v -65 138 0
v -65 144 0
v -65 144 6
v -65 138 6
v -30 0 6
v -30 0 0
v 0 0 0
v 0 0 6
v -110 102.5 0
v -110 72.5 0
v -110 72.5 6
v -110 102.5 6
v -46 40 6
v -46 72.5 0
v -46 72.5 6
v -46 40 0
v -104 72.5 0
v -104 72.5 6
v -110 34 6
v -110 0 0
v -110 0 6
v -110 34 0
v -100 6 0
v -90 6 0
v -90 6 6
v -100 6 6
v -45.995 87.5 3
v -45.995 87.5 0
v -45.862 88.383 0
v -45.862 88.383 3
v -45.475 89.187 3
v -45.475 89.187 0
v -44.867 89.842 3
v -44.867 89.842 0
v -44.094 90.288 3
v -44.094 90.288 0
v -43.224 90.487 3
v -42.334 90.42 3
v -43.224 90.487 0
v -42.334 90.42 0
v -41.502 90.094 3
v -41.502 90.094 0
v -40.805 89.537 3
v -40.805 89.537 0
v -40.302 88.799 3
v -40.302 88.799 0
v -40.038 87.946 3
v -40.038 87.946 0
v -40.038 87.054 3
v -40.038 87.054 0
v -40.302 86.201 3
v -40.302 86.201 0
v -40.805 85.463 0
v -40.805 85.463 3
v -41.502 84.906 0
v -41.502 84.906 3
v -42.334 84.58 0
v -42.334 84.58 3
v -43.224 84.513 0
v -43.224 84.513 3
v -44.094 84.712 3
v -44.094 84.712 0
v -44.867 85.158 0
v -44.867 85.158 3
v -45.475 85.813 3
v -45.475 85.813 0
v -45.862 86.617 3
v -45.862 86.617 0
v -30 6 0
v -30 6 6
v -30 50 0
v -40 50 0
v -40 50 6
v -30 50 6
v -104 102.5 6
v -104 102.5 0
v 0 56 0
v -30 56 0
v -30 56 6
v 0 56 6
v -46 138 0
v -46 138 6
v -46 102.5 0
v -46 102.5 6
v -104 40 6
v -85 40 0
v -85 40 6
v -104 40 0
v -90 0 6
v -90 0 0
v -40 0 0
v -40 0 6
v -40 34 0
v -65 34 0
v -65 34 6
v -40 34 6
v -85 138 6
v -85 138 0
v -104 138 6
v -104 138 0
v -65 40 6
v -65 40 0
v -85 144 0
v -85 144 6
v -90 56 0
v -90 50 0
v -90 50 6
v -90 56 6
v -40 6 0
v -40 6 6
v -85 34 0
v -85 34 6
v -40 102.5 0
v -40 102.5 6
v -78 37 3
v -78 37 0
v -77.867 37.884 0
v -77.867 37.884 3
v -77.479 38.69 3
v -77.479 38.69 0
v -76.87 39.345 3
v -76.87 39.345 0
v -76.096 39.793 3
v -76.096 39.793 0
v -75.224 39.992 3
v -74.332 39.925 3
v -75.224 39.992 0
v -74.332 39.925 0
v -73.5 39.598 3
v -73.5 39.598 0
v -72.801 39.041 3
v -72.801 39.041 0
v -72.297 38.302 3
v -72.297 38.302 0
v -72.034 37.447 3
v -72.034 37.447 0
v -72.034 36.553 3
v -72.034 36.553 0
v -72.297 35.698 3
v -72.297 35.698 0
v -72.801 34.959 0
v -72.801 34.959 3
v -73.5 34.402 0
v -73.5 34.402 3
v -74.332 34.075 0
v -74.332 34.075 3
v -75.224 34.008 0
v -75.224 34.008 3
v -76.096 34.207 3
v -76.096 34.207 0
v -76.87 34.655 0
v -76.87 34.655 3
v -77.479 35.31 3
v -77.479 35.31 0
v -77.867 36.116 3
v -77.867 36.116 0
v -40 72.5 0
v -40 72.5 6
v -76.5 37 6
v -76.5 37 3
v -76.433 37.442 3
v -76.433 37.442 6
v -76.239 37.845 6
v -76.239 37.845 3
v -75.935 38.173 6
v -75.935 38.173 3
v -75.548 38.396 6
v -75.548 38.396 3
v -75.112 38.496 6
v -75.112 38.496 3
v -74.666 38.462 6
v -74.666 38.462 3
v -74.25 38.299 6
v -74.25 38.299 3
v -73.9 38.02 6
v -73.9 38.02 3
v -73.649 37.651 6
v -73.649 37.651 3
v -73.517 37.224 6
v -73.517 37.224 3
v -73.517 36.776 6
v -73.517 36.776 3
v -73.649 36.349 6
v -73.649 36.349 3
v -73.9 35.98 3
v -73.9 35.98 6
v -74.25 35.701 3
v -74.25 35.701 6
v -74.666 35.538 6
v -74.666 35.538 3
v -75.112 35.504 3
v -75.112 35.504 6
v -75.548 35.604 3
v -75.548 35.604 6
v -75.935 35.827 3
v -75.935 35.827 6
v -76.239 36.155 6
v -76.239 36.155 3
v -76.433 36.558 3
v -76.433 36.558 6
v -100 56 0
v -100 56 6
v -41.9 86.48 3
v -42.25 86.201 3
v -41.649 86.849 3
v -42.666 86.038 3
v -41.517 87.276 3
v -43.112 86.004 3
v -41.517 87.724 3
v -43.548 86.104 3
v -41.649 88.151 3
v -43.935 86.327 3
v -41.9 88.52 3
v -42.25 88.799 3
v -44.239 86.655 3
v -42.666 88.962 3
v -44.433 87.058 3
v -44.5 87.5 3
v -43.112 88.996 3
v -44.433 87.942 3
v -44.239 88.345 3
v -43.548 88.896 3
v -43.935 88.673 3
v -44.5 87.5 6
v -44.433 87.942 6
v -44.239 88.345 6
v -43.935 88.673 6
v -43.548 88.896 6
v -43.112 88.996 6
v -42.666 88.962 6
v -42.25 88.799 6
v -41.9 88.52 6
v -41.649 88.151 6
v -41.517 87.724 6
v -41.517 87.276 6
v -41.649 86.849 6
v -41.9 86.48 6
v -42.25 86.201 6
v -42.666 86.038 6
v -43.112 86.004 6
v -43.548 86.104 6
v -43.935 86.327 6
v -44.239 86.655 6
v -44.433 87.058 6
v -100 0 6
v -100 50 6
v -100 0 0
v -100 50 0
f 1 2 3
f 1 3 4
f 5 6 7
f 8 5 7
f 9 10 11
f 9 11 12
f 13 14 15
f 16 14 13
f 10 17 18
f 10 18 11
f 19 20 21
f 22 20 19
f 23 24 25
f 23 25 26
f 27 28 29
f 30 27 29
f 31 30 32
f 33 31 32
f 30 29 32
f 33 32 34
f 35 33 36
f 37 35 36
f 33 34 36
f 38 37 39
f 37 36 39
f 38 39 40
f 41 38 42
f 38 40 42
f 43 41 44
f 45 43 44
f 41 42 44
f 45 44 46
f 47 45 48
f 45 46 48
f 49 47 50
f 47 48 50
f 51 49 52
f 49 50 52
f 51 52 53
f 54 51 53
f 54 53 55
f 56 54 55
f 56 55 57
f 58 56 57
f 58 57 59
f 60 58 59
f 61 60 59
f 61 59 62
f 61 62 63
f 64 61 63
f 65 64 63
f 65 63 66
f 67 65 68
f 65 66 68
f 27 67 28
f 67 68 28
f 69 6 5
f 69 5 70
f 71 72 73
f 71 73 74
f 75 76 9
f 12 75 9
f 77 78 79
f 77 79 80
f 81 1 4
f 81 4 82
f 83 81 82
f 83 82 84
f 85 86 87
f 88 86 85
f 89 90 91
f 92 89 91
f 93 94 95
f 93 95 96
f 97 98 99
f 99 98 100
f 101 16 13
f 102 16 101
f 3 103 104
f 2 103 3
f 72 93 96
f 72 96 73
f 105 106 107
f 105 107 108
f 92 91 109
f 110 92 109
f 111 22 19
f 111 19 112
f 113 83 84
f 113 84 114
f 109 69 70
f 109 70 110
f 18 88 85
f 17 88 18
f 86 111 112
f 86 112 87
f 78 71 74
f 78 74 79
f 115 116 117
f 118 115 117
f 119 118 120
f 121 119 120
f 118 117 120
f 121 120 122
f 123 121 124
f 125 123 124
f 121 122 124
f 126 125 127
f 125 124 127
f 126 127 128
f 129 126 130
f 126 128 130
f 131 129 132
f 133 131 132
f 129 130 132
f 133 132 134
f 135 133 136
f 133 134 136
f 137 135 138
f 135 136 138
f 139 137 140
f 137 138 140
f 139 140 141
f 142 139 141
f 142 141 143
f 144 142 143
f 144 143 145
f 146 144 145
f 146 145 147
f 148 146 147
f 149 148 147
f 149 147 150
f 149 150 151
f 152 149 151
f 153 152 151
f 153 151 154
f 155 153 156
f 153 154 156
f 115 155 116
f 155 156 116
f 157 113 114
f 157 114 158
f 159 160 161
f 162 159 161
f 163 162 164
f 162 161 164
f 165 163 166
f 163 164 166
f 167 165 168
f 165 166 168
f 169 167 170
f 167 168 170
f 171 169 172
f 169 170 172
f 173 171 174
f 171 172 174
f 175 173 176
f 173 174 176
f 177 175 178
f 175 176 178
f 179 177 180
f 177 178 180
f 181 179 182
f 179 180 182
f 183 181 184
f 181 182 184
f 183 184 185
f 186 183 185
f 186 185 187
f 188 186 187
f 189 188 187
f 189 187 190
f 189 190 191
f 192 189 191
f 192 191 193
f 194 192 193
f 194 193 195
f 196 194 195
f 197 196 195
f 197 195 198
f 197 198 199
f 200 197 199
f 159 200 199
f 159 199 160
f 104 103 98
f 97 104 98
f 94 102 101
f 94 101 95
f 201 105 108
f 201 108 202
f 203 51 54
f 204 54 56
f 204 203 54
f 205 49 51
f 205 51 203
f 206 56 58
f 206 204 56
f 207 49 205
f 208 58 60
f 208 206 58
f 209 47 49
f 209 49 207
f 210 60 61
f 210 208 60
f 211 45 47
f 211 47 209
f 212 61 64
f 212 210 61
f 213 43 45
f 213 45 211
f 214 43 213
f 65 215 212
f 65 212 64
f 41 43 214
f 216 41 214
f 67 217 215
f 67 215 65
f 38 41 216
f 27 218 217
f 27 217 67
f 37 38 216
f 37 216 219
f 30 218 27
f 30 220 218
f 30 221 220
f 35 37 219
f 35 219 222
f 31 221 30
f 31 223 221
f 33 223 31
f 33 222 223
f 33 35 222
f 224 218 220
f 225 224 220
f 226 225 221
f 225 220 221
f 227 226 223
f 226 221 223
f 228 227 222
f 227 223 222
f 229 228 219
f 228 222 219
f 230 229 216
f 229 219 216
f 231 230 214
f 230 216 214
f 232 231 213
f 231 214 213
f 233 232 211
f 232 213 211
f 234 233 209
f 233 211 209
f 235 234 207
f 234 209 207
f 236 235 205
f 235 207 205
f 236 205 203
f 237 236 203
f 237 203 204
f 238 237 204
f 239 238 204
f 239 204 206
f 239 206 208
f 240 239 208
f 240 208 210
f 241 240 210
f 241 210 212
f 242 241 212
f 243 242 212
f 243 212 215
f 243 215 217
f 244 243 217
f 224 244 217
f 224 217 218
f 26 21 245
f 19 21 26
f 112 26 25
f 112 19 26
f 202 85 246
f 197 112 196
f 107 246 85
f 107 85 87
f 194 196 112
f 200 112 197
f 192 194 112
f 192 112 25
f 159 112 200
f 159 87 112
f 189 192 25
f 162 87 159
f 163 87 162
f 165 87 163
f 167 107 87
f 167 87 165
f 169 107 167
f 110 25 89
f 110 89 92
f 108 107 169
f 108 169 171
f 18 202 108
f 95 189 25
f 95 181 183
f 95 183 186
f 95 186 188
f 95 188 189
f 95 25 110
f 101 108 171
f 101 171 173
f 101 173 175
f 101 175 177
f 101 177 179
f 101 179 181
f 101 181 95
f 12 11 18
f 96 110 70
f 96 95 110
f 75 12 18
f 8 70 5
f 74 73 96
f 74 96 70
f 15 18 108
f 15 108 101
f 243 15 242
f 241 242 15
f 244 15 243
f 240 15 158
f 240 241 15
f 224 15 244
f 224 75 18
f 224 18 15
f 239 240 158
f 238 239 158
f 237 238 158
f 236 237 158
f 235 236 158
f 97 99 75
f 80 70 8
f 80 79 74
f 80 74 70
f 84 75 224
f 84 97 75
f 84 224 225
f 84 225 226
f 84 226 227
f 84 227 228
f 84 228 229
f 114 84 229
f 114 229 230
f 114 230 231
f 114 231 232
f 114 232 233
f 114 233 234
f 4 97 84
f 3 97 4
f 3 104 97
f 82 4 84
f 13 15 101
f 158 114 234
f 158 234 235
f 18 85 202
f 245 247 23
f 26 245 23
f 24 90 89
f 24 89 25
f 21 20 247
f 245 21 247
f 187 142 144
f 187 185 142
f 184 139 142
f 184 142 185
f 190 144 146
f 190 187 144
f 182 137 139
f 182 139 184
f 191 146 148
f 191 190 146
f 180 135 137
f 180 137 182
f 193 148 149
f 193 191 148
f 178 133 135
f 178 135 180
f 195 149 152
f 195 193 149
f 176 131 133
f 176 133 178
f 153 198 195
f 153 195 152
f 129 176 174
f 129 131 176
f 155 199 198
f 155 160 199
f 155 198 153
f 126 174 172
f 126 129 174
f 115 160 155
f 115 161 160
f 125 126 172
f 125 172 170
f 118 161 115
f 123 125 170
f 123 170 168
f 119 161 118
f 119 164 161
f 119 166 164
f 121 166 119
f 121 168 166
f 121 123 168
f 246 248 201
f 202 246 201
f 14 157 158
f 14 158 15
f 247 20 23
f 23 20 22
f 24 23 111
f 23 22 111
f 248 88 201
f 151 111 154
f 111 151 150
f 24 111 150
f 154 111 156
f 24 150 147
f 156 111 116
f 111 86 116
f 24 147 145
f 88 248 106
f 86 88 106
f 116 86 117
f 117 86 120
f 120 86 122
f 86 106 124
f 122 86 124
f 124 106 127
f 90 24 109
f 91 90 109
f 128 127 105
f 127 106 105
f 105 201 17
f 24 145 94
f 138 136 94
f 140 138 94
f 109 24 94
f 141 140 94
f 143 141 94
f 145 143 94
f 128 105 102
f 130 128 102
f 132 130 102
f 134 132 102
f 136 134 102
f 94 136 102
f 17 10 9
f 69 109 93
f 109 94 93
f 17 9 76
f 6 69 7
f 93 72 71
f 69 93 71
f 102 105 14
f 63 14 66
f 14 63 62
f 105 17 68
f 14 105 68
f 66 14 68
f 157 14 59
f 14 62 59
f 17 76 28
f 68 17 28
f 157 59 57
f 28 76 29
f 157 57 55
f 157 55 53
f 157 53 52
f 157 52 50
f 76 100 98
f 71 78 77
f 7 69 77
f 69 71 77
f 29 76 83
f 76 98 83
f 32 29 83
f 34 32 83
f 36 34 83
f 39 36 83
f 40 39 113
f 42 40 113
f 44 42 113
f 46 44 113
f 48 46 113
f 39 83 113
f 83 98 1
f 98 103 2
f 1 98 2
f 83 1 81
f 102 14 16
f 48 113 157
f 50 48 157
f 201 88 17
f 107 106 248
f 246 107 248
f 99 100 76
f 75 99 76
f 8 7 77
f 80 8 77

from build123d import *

# Parameters (mm, degrees)
ESQUISSE1_W             = 110
ESQUISSE1_H             = 144
BOSS_EXTRU_1_DEPTH      = 6
ESQUISSE2_W             = 10
ESQUISSE2_H             = 6
ENL_V_MAT_EXTRU_1_DEPTH = 182.306370544
ESQUISSE3_R             = 1.5
ENL_V_MAT_EXTRU_2_DEPTH = 182.306370544
ESQUISSE4_R             = 2.995
ESQUISSE4_R_2           = 3
ENL_V_MAT_EXTRU_3_DEPTH = 3


with BuildPart() as part:
    # Esquisse1 → Boss.-Extru.1 (new body)
    with BuildSketch(Plane.XY):
        with Locations((-55, 72)):
            Rectangle(ESQUISSE1_W, ESQUISSE1_H)
    extrude(amount=BOSS_EXTRU_1_DEPTH)

    # Esquisse2 → Enlèv. mat.-Extru.1 (cut, through all)
    with BuildSketch(Plane(origin=(0, 0, 0), x_dir=(-1, 0, 0), z_dir=(0, 0, -1))):
        Polygon((40, 102.5), (40, 72.5), (46, 72.5), (46, 40), (65, 40), (65, 34), (40, 34), (40, 50), (30, 50), (30, 56), (0, 56), (0, 144), (65, 144), (65, 138), (46, 138), (46, 102.5), align=None)
        Polygon((110, 144), (85, 144), (85, 138), (104, 138), (104, 102.5), (110, 102.5), align=None)
        Polygon((110, 72.5), (110, 34), (85, 34), (85, 40), (104, 40), (104, 72.5), align=None)
        with Locations((95, 3)):
            Rectangle(ESQUISSE2_W, ESQUISSE2_H)
        with Locations((35, 3)):
            Rectangle(ESQUISSE2_W, ESQUISSE2_H)
        with Locations((95, 53)):
            Rectangle(ESQUISSE2_W, ESQUISSE2_H)
    extrude(amount=-ENL_V_MAT_EXTRU_1_DEPTH, mode=Mode.SUBTRACT)

    # Esquisse3 → Enlèv. mat.-Extru.2 (cut, through all)
    with BuildSketch(Plane(origin=(0, 0, 0), x_dir=(-1, 0, 0), z_dir=(0, 0, -1))):
        with Locations((43, 87.5)):
            Circle(ESQUISSE3_R)
        with Locations((75, 37)):
            Circle(ESQUISSE3_R)
    extrude(amount=-ENL_V_MAT_EXTRU_2_DEPTH, mode=Mode.SUBTRACT)

    # Esquisse4 → Enlèv. mat.-Extru.3 (cut)
    with BuildSketch(Plane(origin=(0, 0, 0), x_dir=(-1, 0, 0), z_dir=(0, 0, -1))):
        with Locations((43, 87.5)):
            Circle(ESQUISSE4_R)
        with Locations((75, 37)):
            Circle(ESQUISSE4_R_2)
    extrude(amount=-ENL_V_MAT_EXTRU_3_DEPTH, mode=Mode.SUBTRACT)


solid = part.part
